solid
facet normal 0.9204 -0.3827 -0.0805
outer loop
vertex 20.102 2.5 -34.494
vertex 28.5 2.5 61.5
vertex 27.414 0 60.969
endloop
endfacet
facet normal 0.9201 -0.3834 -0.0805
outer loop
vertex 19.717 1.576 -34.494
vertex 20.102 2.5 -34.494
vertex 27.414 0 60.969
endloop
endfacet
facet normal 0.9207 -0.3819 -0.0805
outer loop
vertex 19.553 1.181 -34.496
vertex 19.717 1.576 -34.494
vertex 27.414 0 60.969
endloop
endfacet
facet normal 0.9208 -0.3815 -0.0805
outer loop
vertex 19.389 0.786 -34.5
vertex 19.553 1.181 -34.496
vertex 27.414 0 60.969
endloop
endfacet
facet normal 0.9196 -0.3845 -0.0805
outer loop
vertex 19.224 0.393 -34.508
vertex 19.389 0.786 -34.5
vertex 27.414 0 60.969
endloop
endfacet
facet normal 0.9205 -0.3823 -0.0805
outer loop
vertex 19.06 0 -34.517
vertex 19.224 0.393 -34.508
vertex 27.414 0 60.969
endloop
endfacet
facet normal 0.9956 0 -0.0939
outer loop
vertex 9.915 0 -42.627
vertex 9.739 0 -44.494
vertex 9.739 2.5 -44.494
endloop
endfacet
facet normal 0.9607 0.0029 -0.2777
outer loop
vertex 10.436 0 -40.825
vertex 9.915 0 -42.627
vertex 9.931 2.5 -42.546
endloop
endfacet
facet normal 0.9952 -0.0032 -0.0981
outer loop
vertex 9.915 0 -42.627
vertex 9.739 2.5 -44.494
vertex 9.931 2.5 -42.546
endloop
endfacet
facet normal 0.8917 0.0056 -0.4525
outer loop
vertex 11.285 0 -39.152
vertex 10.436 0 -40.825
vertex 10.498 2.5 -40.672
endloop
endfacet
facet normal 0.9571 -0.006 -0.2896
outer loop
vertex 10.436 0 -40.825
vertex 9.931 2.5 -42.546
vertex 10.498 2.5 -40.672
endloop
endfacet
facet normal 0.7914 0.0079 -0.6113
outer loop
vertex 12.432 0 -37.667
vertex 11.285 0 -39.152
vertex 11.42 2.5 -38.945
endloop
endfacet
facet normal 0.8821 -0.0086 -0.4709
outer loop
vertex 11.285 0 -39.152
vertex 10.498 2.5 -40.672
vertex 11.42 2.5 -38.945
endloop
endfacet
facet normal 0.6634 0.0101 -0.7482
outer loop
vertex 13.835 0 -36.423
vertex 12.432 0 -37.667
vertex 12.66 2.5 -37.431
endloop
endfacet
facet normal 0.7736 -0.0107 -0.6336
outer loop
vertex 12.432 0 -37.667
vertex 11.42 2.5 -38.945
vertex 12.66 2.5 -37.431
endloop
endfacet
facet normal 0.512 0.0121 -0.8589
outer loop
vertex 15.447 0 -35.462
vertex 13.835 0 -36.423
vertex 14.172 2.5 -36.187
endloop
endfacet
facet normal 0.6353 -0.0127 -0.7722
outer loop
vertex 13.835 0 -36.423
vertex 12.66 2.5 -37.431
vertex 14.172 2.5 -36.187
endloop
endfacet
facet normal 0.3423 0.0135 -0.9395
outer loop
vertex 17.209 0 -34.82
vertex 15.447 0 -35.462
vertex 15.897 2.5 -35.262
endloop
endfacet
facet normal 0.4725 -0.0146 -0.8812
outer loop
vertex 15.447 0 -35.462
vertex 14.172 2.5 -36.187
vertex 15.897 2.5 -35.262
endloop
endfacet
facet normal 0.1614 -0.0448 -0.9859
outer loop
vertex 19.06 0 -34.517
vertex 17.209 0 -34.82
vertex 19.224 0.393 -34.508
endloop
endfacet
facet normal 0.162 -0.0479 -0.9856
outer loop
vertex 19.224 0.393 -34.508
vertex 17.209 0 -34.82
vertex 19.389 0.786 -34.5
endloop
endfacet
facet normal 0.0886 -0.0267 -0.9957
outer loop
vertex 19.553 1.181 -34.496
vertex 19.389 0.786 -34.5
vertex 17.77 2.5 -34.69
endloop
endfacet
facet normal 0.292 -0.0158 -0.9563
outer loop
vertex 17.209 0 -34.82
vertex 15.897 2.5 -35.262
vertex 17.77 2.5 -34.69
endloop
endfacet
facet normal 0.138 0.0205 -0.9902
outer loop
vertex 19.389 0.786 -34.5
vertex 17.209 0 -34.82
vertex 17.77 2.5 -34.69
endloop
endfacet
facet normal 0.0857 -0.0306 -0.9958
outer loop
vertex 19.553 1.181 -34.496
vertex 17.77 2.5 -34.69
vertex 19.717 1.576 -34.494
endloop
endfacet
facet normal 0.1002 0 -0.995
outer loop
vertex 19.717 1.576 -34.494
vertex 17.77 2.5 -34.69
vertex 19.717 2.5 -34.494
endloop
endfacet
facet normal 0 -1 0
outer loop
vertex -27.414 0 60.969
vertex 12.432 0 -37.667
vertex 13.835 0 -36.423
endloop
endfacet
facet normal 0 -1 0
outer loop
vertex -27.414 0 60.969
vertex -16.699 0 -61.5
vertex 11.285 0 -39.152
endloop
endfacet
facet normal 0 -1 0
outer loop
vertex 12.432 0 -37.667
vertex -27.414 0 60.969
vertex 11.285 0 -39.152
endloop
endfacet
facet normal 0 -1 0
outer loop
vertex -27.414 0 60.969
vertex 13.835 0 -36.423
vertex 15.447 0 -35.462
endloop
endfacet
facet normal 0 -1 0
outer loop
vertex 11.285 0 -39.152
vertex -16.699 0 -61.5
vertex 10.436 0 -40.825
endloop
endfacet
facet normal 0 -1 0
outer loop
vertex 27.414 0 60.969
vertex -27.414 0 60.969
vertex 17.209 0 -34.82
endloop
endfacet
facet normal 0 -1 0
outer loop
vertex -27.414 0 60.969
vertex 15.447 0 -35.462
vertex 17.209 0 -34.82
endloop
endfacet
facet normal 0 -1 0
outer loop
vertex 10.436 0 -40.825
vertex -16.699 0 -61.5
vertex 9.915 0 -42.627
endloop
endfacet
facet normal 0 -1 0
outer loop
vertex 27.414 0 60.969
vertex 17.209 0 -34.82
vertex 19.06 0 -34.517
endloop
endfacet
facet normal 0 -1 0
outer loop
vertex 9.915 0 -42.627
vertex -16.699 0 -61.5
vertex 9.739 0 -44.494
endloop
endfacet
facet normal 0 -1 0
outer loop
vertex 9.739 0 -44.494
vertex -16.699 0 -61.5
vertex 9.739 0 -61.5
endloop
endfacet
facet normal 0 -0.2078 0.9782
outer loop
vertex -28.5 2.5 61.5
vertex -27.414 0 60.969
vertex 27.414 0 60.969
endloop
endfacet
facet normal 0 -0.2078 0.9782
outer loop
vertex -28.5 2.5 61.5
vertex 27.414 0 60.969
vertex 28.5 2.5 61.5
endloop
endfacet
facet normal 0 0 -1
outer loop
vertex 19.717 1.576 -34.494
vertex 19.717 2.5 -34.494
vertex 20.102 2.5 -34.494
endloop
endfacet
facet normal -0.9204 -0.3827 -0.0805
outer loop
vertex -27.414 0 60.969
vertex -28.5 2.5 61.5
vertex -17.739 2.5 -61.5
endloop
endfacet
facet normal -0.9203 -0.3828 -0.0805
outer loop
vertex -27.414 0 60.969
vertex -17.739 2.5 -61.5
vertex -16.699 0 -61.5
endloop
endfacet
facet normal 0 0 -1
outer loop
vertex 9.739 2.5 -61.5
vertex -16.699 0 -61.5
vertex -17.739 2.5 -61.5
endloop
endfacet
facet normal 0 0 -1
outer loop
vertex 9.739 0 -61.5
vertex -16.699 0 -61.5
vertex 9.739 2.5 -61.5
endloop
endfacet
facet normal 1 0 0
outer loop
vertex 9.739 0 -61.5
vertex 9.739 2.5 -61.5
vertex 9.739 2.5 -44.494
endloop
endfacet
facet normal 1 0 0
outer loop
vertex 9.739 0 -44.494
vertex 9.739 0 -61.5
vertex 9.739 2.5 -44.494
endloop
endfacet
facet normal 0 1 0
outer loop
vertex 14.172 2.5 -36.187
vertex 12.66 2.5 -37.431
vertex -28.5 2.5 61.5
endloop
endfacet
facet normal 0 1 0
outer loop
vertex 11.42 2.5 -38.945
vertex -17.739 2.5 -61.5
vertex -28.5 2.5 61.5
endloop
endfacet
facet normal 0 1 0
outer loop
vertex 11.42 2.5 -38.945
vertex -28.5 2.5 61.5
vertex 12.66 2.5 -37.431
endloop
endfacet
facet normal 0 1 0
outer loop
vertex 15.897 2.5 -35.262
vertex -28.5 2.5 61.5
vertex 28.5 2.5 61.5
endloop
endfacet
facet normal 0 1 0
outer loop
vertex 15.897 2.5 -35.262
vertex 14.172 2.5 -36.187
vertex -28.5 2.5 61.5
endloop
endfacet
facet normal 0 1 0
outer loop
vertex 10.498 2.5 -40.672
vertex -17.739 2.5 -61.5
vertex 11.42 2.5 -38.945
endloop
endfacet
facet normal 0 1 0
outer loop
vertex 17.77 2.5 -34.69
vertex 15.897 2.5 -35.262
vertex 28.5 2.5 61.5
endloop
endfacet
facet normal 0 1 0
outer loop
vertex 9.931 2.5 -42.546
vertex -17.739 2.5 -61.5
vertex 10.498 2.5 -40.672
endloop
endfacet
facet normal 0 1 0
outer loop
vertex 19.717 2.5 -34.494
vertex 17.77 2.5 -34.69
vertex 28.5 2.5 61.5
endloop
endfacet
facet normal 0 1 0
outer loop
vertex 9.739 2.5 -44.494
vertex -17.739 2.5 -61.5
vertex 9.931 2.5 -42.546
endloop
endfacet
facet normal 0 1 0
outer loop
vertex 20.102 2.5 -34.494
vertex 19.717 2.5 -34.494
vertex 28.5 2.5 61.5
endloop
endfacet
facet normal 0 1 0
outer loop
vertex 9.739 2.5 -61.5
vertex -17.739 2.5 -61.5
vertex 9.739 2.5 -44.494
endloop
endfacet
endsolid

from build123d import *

# Parameters (mm, degrees)
SKIZZE1_W                            = 57
SKIZZE1_H                            = 123
AUFSATZ_LINEAR_AUSTRAGEN1_DEPTH      = 2.5
SCHNITT_LINEAR_AUSTRAGEN1_DEPTH      = 84.889808678
SCHNITT_LINEAR_AUSTRAGEN2_DEPTH      = 68.828828679
SCHNITT_LINEAR_AUSTRAGEN3_DEPTH      = 70.726045338
SCHNITT_LINEAR_AUSTRAGEN3_DEPTH_BACK = 70.726045338
SCHNITT_LINEAR_AUSTRAGEN4_DEPTH      = 70.47454308
SCHNITT_LINEAR_AUSTRAGEN4_DEPTH_BACK = 70.47454308
SCHNITT_LINEAR_AUSTRAGEN5_DEPTH      = 68.828828679


with BuildPart() as part:
    # Skizze1 → Aufsatz-Linear austragen1 (new body)
    with BuildSketch(Plane(origin=(0, 0, 0), x_dir=(1, 0, 0), z_dir=(0, 1, 0))):
        Rectangle(SKIZZE1_W, SKIZZE1_H)
    extrude(amount=AUFSATZ_LINEAR_AUSTRAGEN1_DEPTH)

    # Skizze2 → Schnitt-Linear austragen1 (cut, through all)
    with BuildSketch(Plane(origin=(28.5, 0, 0), x_dir=(0, 0, -1), z_dir=(1, 0, 0))):
        Polygon((-61.5, 2.5), (-61.5, 0), (-60.968608596, 0), align=None)
    extrude(amount=-SCHNITT_LINEAR_AUSTRAGEN1_DEPTH, mode=Mode.SUBTRACT)

    # Skizze3 → Schnitt-Linear austragen2 (cut, through all)
    with BuildSketch(Plane(origin=(0, 2.5, 0), x_dir=(1, 0, 0), z_dir=(0, 1, 0))):
        Polygon((-28.5, -61.5), (-17.738894386, 61.5), (-28.5, 61.5), align=None)
        Polygon((28.5, -61.5), (17.738894386, 61.5), (28.5, 61.5), align=None)
    extrude(amount=-SCHNITT_LINEAR_AUSTRAGEN2_DEPTH, mode=Mode.SUBTRACT)

    # Skizze5 → Schnitt-Linear austragen3 (cut, two sides: drawn at the far end of the back side and taken through both)
    with BuildSketch(Plane(origin=(0.175618176, 0, 2.007324937), x_dir=(0, -1, 0), z_dir=(0.08715574274765484, 0, 0.9961946980917459)).offset(-SCHNITT_LINEAR_AUSTRAGEN3_DEPTH_BACK)):
        Polygon((0.008562414, 23.031470717), (-2.5, 23.031470717), (0, 21.995936811), align=None)
    extrude(amount=SCHNITT_LINEAR_AUSTRAGEN3_DEPTH + SCHNITT_LINEAR_AUSTRAGEN3_DEPTH_BACK, mode=Mode.SUBTRACT)

    # Skizze6 → Schnitt-Linear austragen4 (cut, two sides: drawn at the far end of the back side and taken through both)
    with BuildSketch(Plane(origin=(-0.152372814, 0, 1.741629235), x_dir=(0, 1, 0), z_dir=(-0.08715574274766175, 0, 0.9961946980917452)).offset(-SCHNITT_LINEAR_AUSTRAGEN4_DEPTH_BACK)):
        Polygon((2.5, 23.031470717), (0, 21.995936811), (0, 23.031470717), align=None)
    extrude(amount=SCHNITT_LINEAR_AUSTRAGEN4_DEPTH + SCHNITT_LINEAR_AUSTRAGEN4_DEPTH_BACK, mode=Mode.SUBTRACT)

    # Skizze8 → Schnitt-Linear austragen5 (cut, through all)
    with BuildSketch(Plane(origin=(0, 2.5, 0), x_dir=(1, 0, 0), z_dir=(0, 1, 0))):
        with BuildLine():
            Line((17.738894386, 61.5), (9.738894386, 61.5))
            Line((9.738894386, 61.5), (9.738894386, 44.5))
            Line((9.738894386, 44.5), (9.738894386, 44.494341137))
            ThreePointArc((9.738894386, 44.494341137), (12.660237078, 37.430870976), (19.717416528, 34.494364202))
            Line((19.717416528, 34.494364202), (20.101653571, 34.493538941))
            Line((20.101653571, 34.493538941), (17.738894386, 61.5))
        make_face()
    extrude(amount=-SCHNITT_LINEAR_AUSTRAGEN5_DEPTH, mode=Mode.SUBTRACT)


solid = part.part
